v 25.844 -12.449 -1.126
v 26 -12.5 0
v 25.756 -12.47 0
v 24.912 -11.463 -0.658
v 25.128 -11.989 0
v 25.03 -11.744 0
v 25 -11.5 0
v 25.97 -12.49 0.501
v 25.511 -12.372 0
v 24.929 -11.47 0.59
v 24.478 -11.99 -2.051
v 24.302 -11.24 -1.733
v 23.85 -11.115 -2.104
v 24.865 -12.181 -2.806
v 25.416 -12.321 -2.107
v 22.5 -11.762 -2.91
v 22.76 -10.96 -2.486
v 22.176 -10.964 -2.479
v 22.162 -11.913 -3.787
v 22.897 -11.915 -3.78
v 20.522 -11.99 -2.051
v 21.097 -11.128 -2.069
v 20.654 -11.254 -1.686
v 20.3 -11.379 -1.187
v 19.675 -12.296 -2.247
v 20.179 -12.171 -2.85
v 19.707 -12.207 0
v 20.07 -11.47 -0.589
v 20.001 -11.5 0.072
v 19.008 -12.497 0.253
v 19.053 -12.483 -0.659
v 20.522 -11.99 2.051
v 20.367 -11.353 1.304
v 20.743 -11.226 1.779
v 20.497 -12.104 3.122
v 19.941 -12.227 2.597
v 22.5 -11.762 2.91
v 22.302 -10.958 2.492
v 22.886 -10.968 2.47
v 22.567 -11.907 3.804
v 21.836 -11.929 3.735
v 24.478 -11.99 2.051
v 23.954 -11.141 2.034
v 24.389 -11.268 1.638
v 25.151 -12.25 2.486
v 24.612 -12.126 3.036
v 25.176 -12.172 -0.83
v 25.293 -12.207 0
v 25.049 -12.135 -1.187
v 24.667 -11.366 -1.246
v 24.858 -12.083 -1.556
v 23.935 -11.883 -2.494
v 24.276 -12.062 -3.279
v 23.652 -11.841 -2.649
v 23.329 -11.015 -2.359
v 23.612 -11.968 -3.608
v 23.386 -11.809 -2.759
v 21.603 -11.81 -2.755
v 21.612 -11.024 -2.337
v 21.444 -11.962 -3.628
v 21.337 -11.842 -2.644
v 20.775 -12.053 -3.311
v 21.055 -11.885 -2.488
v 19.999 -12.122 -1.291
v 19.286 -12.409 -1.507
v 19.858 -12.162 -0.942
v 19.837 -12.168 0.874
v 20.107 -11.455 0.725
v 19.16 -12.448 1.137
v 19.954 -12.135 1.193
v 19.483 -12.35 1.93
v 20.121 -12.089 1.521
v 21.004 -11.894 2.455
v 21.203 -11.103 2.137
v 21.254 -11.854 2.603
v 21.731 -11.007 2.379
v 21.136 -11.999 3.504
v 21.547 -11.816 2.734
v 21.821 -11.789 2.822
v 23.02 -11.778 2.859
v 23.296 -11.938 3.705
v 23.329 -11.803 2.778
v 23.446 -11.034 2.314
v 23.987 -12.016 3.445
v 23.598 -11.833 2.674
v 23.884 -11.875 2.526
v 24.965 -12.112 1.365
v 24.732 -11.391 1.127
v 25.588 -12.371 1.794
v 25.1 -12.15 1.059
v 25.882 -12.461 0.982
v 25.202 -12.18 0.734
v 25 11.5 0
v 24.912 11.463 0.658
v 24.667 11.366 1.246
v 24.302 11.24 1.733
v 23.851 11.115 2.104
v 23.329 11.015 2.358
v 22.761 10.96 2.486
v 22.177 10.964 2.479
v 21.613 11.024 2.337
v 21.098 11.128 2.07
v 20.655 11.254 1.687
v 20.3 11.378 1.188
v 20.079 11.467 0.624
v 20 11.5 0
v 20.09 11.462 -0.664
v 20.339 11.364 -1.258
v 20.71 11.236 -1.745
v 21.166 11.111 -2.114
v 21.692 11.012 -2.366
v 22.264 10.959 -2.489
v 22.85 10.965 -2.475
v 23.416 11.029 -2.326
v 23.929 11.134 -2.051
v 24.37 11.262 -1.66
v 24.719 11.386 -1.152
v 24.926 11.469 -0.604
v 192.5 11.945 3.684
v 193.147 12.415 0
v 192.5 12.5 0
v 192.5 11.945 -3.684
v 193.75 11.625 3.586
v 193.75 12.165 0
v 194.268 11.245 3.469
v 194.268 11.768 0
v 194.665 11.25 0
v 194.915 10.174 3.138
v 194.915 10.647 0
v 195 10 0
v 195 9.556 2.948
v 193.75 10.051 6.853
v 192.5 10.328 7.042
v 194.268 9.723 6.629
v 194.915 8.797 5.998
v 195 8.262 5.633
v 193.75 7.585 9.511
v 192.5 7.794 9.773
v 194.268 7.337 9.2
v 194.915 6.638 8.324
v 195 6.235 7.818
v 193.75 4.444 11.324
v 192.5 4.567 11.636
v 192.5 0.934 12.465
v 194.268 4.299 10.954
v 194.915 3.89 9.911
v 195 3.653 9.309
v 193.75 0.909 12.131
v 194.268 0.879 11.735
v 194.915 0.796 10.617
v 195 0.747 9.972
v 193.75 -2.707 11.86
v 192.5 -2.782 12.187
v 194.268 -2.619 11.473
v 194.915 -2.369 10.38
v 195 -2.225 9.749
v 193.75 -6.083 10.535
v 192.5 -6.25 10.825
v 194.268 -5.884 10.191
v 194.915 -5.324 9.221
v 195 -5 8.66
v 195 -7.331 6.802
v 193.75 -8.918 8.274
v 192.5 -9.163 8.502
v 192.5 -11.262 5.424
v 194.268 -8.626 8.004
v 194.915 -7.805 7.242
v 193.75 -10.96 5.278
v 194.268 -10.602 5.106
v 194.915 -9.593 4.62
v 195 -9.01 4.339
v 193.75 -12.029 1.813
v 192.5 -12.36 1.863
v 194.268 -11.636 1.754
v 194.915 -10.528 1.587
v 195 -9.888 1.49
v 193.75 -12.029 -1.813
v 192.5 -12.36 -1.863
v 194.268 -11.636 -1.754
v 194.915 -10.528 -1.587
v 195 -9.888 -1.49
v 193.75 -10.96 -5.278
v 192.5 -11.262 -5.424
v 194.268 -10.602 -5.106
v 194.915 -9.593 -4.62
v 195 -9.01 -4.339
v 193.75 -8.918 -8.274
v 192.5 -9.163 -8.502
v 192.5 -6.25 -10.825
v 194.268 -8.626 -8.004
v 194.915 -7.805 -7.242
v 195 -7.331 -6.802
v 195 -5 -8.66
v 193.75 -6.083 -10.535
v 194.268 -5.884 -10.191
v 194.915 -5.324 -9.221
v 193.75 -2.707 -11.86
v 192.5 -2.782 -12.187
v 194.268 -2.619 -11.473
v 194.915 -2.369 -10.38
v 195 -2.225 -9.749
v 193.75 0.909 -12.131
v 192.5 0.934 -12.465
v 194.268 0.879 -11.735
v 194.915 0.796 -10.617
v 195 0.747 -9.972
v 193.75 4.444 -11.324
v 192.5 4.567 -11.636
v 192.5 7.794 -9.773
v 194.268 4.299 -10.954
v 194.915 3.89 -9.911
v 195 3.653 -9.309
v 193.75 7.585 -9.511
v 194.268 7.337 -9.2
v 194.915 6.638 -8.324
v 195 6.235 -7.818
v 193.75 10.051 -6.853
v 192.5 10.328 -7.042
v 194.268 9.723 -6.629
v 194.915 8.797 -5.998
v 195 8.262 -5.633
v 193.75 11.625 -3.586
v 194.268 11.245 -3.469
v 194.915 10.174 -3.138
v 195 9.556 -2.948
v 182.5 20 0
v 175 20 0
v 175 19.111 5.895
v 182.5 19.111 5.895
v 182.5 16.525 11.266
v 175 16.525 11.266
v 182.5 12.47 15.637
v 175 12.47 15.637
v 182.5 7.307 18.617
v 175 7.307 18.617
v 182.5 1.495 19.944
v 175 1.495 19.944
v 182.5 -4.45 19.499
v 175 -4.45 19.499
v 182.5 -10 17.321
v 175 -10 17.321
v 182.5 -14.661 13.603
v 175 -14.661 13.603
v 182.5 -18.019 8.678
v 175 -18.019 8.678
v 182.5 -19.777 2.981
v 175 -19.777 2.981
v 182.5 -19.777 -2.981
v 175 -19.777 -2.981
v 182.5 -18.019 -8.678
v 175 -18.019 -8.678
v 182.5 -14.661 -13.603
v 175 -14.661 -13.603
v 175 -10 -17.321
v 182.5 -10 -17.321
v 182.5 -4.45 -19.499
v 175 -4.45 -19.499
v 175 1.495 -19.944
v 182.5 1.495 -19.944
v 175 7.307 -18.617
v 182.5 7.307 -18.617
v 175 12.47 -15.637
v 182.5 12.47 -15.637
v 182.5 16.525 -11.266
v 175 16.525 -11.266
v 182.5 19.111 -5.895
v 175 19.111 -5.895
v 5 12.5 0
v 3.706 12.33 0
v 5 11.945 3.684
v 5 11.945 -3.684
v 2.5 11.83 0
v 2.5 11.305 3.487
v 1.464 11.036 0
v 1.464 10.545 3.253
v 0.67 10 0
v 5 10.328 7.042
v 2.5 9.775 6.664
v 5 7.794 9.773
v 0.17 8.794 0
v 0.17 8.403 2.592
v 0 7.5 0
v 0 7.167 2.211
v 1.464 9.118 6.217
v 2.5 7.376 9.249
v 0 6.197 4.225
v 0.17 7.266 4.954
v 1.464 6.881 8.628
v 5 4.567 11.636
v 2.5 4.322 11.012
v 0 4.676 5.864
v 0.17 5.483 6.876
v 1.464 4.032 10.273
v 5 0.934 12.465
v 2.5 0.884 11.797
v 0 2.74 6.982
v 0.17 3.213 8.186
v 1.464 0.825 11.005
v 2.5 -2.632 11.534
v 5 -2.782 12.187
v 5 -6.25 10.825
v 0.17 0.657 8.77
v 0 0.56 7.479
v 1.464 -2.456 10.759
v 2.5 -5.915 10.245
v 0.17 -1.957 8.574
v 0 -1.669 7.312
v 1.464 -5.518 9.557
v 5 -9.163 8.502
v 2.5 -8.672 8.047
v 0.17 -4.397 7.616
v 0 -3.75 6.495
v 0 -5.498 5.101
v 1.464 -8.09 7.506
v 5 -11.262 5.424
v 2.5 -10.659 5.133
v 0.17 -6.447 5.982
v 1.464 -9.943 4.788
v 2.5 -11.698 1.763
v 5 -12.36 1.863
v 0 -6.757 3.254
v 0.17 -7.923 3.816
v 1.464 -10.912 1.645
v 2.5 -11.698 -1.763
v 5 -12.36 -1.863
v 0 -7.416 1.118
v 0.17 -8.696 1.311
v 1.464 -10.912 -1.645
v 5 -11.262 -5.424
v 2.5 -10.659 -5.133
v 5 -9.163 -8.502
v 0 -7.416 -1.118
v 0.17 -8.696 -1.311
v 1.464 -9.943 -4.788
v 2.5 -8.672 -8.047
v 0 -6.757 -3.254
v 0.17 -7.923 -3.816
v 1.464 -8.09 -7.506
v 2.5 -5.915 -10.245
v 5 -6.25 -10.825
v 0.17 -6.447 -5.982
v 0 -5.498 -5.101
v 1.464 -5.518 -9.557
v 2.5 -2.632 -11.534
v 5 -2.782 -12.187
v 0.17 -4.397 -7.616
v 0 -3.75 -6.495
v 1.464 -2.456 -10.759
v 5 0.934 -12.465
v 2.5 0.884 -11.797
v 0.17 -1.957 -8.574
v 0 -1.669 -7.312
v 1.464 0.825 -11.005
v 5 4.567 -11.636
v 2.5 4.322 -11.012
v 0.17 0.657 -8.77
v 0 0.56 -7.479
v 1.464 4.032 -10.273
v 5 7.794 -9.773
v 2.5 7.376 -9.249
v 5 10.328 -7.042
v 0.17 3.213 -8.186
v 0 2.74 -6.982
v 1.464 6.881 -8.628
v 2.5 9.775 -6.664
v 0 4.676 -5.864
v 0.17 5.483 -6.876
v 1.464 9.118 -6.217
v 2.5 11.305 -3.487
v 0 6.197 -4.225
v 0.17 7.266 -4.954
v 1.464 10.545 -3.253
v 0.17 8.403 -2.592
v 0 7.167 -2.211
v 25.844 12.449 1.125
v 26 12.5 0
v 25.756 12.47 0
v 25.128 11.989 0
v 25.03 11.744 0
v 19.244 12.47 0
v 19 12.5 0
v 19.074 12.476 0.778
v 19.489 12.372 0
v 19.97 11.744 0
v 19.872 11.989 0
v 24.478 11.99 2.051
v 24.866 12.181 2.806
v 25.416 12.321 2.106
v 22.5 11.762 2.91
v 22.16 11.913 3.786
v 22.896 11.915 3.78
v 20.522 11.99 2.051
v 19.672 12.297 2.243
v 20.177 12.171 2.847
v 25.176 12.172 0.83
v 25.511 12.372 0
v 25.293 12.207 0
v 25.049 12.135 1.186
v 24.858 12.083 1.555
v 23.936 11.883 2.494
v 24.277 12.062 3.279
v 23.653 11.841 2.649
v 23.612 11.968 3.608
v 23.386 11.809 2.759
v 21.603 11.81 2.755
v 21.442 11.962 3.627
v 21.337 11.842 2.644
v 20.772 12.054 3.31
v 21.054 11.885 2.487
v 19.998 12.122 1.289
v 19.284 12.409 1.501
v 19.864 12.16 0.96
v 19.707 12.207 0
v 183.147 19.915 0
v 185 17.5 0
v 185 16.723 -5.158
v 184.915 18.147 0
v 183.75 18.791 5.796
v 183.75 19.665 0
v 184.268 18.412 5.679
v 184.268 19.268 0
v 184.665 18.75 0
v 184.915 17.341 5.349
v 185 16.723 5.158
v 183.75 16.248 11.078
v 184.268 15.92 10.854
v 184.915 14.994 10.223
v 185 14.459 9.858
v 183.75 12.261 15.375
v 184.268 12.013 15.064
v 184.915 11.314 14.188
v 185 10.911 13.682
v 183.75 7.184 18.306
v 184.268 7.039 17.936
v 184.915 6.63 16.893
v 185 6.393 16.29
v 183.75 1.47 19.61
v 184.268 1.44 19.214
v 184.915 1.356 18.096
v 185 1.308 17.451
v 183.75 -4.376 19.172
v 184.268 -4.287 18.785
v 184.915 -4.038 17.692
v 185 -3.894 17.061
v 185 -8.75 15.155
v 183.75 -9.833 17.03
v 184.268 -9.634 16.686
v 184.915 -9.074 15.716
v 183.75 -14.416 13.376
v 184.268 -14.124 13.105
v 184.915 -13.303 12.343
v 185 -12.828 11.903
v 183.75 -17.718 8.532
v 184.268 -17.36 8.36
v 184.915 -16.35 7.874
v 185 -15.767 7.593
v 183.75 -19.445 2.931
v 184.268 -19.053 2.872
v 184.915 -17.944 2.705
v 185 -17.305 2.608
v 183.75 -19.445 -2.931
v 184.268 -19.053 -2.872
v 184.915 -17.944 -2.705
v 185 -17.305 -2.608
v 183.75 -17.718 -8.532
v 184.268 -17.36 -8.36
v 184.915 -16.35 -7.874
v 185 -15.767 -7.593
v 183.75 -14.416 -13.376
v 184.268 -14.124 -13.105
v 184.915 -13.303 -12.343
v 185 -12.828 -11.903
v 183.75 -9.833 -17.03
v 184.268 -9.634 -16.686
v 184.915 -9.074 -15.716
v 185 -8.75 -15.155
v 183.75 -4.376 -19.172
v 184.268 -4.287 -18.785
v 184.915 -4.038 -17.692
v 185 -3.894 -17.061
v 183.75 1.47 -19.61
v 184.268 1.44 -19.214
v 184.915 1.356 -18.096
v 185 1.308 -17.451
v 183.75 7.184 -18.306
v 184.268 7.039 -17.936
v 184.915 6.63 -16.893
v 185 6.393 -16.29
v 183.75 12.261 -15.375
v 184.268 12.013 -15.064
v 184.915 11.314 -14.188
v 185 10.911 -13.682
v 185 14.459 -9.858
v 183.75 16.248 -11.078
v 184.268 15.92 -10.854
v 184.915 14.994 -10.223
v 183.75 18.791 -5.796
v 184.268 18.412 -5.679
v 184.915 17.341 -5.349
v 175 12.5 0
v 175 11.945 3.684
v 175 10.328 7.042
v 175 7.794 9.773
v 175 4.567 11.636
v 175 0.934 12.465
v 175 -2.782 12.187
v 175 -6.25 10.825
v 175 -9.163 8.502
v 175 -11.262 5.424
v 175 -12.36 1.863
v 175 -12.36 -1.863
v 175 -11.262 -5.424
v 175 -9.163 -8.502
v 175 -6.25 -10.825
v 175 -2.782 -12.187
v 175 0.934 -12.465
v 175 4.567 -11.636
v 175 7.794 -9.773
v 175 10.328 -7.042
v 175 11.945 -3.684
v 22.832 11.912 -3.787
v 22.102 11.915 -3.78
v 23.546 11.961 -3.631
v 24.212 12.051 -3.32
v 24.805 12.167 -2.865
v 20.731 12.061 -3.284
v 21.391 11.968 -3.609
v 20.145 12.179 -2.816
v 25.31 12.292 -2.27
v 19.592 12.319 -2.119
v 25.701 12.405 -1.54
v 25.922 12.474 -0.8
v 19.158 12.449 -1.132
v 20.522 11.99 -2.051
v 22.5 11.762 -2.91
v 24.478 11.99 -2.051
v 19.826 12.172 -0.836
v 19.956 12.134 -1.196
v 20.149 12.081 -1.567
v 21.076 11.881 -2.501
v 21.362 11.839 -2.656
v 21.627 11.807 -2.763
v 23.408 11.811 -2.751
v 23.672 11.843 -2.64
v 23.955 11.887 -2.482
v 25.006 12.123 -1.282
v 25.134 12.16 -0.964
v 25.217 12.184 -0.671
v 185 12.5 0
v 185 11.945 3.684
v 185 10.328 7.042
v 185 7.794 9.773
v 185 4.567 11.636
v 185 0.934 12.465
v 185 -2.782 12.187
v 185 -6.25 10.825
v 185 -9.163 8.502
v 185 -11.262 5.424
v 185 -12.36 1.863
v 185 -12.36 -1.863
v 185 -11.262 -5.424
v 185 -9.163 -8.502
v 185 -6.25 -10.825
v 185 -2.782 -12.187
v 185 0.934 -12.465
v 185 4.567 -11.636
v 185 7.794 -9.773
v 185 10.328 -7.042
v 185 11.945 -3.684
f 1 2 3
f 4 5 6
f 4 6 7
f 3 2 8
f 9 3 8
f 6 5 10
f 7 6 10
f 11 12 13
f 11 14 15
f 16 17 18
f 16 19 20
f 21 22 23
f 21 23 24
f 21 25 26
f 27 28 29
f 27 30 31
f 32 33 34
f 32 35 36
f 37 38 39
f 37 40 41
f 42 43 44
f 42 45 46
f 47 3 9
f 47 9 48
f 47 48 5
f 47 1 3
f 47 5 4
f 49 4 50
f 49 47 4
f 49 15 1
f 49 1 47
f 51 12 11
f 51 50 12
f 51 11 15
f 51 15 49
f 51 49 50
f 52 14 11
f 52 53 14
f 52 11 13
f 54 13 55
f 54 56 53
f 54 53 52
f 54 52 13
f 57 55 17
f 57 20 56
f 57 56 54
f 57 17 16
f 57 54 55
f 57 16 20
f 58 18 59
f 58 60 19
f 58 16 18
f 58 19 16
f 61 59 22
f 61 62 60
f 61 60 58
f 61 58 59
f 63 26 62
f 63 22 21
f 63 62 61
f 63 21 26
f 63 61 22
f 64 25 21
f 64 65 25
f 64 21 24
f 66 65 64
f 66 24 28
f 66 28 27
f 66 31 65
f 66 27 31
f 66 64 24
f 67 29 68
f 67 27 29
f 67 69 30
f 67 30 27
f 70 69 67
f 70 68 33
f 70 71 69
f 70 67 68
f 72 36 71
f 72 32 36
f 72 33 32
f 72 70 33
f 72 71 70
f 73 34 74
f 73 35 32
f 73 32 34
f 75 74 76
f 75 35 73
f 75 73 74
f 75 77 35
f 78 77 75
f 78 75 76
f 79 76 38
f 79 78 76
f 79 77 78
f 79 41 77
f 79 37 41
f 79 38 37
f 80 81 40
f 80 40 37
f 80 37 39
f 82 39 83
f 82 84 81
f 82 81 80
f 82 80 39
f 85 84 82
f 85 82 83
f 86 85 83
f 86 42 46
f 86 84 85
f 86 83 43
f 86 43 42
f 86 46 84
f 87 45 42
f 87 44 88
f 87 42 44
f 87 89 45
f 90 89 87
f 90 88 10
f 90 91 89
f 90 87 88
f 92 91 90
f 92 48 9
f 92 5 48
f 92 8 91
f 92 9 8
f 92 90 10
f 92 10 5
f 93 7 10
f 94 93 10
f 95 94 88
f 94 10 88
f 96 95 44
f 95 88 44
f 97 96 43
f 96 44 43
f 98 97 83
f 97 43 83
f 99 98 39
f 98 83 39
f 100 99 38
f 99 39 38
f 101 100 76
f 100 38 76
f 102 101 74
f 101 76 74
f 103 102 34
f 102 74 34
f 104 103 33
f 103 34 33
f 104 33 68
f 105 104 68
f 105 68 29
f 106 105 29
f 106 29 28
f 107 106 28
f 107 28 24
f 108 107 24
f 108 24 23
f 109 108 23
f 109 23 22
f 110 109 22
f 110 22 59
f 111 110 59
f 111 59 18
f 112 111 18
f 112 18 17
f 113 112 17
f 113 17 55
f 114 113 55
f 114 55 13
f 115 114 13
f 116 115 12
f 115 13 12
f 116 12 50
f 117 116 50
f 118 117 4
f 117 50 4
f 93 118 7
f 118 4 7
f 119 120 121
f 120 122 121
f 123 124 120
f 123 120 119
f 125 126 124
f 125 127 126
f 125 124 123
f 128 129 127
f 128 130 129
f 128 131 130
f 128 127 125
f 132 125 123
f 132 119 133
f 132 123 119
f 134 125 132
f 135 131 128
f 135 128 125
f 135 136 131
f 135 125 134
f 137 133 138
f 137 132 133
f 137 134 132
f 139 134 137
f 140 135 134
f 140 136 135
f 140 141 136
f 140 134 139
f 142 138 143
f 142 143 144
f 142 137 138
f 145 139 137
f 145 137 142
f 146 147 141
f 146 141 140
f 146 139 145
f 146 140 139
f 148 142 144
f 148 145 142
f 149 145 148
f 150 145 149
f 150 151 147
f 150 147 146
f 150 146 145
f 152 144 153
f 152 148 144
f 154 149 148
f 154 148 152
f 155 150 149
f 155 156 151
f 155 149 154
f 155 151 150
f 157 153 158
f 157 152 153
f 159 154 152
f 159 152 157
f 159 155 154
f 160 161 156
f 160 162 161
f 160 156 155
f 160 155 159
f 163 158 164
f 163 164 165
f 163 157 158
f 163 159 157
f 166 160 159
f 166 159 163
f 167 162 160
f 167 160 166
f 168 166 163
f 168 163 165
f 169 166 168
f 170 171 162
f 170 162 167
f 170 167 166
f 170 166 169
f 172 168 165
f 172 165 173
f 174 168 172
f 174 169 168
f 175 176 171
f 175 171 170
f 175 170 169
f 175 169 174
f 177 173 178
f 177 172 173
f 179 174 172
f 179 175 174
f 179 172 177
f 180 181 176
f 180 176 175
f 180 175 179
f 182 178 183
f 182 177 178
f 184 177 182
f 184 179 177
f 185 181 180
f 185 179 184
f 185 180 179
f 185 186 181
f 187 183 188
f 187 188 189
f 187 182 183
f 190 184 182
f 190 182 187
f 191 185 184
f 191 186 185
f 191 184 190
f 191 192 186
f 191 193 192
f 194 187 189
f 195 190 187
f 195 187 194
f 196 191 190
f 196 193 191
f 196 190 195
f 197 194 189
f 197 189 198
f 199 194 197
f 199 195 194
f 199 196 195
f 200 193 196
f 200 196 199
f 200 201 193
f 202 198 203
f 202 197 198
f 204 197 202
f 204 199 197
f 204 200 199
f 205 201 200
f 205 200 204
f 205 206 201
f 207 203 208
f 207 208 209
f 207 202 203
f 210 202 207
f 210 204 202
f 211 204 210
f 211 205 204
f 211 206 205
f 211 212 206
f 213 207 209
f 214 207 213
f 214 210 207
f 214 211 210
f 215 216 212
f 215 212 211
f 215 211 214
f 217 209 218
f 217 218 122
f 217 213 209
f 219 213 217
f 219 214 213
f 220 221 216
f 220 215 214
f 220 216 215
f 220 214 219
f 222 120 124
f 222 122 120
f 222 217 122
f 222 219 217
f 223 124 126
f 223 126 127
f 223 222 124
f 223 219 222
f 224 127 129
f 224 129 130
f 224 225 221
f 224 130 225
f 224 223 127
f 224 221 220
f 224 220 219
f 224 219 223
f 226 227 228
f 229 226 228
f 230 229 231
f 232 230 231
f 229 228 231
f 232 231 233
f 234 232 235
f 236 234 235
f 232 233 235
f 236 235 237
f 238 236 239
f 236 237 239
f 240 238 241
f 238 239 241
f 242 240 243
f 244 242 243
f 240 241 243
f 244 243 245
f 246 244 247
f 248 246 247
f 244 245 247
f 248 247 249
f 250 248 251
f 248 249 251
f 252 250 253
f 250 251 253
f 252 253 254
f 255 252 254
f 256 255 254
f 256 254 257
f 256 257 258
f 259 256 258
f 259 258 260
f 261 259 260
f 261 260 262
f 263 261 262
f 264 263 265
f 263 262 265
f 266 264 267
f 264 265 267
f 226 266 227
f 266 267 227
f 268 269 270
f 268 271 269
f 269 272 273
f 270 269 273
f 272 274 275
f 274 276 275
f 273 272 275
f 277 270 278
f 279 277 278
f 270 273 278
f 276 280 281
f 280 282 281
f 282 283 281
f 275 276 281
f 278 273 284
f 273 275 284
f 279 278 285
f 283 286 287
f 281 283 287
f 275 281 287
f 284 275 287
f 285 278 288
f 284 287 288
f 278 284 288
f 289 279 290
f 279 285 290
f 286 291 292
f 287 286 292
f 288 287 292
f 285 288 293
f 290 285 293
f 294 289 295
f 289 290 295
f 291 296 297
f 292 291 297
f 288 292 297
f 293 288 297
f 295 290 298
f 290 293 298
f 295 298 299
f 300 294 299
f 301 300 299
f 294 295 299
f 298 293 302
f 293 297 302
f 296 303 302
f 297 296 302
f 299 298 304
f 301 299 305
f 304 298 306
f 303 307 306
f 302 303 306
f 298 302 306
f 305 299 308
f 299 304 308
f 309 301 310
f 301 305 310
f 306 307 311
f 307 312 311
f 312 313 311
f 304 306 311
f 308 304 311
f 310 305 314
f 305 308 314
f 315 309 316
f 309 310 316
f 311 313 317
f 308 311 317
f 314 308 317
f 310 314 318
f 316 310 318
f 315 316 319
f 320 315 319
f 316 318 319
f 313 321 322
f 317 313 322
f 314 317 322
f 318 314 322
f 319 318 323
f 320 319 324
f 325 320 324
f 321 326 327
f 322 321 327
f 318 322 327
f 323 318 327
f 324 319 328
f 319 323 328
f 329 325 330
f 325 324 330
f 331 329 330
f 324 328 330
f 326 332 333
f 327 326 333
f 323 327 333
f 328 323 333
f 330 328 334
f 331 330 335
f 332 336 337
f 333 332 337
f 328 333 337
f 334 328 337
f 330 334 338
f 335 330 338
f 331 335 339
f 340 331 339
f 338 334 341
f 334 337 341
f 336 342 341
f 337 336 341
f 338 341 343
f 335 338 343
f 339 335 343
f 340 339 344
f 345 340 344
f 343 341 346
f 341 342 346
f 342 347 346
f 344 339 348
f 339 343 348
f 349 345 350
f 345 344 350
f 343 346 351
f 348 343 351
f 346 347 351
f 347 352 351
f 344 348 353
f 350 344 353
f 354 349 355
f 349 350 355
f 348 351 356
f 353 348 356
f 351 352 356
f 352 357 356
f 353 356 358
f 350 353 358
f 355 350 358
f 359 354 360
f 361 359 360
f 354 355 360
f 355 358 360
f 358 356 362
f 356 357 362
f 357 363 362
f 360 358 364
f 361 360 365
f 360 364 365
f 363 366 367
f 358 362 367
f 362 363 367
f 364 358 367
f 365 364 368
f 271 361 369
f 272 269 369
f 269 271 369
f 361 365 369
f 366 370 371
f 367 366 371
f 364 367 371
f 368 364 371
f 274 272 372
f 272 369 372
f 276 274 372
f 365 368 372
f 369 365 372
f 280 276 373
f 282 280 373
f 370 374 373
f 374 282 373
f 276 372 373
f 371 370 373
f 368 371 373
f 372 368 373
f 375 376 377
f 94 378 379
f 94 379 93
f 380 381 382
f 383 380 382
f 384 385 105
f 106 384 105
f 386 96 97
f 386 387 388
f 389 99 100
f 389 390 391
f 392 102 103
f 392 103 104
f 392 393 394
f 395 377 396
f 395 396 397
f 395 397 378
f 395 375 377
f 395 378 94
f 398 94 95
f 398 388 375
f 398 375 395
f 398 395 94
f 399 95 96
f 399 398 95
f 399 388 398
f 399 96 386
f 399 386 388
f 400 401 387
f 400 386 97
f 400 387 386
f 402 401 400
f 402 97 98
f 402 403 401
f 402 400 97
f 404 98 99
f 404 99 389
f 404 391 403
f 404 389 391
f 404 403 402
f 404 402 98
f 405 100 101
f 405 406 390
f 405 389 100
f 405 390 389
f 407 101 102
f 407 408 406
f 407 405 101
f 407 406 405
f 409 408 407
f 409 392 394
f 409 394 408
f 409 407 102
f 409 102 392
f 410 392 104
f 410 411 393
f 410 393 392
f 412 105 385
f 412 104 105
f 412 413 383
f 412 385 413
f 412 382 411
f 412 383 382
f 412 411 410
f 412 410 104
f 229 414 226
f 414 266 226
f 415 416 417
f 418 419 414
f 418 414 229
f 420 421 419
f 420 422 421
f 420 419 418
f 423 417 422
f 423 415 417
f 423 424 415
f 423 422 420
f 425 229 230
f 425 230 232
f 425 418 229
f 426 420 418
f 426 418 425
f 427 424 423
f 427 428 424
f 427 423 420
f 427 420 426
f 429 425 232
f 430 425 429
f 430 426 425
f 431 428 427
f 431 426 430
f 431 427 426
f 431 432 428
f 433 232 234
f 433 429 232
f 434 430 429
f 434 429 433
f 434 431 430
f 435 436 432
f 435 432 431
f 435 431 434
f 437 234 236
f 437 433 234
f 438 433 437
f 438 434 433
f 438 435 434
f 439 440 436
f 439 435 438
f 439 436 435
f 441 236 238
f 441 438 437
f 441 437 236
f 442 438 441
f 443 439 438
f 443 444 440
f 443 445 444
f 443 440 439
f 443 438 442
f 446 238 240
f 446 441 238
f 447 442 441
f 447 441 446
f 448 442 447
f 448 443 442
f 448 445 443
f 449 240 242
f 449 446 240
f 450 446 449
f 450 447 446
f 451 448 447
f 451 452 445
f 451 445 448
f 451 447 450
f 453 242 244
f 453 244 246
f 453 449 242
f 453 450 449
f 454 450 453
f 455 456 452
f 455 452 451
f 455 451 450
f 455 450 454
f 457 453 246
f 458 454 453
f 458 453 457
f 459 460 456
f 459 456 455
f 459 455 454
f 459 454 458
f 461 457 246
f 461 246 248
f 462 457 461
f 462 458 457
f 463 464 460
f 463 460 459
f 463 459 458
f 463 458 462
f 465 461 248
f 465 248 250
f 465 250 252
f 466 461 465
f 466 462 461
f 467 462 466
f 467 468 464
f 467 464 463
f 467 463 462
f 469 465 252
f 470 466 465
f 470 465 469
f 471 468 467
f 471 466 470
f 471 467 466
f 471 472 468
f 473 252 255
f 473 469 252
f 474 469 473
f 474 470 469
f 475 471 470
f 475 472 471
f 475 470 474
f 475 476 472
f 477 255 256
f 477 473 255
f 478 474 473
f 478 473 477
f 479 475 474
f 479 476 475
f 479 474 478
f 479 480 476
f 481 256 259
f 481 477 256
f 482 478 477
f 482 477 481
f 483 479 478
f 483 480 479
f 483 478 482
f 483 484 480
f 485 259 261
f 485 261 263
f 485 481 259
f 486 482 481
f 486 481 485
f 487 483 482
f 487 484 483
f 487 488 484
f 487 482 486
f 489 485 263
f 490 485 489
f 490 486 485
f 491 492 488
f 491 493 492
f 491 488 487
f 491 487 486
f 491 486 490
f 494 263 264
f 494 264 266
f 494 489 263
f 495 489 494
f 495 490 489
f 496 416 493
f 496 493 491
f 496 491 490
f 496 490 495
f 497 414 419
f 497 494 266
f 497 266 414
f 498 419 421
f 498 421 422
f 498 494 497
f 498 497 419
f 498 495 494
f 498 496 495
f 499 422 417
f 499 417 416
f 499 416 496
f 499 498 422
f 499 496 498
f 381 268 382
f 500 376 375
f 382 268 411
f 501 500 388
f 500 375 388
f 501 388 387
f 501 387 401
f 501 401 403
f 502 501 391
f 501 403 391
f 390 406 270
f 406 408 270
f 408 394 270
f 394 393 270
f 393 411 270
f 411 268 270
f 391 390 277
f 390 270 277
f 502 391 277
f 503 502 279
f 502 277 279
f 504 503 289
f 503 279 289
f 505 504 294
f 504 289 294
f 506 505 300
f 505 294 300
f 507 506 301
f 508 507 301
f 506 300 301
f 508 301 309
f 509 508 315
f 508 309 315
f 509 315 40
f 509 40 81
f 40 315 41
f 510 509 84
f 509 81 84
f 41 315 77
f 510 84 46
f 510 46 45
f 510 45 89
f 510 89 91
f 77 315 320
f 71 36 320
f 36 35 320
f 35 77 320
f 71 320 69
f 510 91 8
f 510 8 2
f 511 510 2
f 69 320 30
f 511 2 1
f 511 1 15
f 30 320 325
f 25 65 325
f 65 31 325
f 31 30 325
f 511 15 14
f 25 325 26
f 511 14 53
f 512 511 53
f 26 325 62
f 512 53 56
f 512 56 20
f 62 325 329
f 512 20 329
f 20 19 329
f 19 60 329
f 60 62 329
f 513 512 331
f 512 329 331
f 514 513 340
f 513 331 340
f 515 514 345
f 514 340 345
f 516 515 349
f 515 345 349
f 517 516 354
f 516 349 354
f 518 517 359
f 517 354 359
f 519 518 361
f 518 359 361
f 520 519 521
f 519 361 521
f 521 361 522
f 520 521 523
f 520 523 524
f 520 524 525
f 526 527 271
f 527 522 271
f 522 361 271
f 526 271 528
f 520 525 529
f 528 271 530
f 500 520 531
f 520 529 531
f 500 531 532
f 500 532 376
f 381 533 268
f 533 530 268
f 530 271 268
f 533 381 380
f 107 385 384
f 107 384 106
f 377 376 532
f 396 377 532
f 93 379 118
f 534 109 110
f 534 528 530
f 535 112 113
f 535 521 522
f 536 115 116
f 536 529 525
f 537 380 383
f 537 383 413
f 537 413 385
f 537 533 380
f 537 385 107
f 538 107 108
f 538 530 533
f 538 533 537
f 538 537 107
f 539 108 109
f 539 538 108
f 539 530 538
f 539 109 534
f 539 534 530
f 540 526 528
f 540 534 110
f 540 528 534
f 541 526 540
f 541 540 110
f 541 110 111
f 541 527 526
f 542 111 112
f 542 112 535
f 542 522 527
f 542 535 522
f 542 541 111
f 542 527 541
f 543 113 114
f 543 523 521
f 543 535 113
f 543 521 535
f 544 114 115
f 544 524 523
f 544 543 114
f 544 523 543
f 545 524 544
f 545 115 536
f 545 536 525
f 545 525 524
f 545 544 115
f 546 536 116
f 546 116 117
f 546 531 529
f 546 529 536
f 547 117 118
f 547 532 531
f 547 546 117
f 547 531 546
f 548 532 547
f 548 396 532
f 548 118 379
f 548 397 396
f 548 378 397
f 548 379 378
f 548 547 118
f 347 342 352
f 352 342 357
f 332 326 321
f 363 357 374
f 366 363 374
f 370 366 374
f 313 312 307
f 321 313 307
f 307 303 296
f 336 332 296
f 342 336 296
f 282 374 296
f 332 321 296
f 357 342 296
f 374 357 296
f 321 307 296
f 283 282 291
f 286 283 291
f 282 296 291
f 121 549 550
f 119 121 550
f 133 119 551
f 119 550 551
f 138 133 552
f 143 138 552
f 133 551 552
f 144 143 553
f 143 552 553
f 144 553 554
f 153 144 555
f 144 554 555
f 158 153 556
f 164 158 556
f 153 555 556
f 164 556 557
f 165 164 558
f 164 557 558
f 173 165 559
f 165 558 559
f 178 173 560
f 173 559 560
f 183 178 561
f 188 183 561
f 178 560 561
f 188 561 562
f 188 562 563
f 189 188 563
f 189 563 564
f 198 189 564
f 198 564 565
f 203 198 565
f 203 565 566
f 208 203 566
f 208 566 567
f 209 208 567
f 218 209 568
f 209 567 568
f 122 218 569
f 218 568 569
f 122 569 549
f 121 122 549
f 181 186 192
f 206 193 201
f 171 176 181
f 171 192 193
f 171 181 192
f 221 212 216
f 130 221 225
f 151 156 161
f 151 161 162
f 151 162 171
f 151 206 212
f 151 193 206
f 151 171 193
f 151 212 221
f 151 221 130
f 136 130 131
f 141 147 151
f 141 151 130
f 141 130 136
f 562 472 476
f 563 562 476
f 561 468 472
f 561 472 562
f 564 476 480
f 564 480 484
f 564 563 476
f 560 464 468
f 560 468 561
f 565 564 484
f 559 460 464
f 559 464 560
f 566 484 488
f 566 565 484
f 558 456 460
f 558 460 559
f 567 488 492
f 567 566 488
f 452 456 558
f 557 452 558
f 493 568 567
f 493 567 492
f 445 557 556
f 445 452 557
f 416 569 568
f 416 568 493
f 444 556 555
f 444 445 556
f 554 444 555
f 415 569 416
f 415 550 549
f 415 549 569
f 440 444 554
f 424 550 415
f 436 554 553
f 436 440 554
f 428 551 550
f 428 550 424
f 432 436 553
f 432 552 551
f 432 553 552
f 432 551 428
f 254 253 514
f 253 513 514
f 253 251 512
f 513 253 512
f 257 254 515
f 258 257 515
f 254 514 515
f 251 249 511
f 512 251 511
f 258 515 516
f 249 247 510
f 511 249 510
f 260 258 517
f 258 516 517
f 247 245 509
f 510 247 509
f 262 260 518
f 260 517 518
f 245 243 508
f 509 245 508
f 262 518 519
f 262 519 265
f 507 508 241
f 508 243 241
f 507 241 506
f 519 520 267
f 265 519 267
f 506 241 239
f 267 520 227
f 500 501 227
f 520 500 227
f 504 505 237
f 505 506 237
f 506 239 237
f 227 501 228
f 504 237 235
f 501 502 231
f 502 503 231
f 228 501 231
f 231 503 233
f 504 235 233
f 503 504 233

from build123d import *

# Parameters (mm, degrees)
F0_R     = 12.5
F1_DEPTH = 175
F2_R     = 20
F3_DEPTH = 10
F4_R     = 12.5
F5_DEPTH = 10
F6_R     = 2.5
F7_R     = 2.5
F8_DEPTH = 12.5
F9_R     = 1
F10_R    = 5


with BuildPart() as f1:
    # F0 (on Right) → F1 (new body)
    with BuildSketch(Plane.YZ):
        Circle(F0_R)
    extrude(amount=F1_DEPTH)

    # F2 (on face) → F3 (join)
    with BuildSketch(Plane.YZ.offset(175)):
        Circle(F2_R)
    extrude(amount=F3_DEPTH)

    # F4 (on face) → F5 (join)
    with BuildSketch(Plane.YZ.offset(185)):
        Circle(F4_R)
    extrude(amount=F5_DEPTH)

    # F6
    f6_edges = [f1.edges().sort_by_distance(p)[0] for p in [
        (195, -12.5, 0),
        (185, -20, 0),
    ]]
    fillet(f6_edges, radius=F6_R)

    # F7 (on Front) → F8 (cut, symmetric)
    with BuildSketch(Plane.XZ):
        with Locations((22.5, 0)):
            Circle(F7_R)
    extrude(amount=F8_DEPTH, both=True, mode=Mode.SUBTRACT)

    # F9
    f9_edges = [f1.edges().sort_by_distance(p)[0] for p in [
        (22.5, 12.247449, 2.5),
        (22.5, 12.247449, -2.5),
        (20, -12.5, 0),
    ]]
    fillet(f9_edges, radius=F9_R)

    # F10
    f10_edges = [f1.edges().sort_by_distance(p)[0] for p in [
        (0, -12.5, 0),
    ]]
    fillet(f10_edges, radius=F10_R)


solid = f1.part
